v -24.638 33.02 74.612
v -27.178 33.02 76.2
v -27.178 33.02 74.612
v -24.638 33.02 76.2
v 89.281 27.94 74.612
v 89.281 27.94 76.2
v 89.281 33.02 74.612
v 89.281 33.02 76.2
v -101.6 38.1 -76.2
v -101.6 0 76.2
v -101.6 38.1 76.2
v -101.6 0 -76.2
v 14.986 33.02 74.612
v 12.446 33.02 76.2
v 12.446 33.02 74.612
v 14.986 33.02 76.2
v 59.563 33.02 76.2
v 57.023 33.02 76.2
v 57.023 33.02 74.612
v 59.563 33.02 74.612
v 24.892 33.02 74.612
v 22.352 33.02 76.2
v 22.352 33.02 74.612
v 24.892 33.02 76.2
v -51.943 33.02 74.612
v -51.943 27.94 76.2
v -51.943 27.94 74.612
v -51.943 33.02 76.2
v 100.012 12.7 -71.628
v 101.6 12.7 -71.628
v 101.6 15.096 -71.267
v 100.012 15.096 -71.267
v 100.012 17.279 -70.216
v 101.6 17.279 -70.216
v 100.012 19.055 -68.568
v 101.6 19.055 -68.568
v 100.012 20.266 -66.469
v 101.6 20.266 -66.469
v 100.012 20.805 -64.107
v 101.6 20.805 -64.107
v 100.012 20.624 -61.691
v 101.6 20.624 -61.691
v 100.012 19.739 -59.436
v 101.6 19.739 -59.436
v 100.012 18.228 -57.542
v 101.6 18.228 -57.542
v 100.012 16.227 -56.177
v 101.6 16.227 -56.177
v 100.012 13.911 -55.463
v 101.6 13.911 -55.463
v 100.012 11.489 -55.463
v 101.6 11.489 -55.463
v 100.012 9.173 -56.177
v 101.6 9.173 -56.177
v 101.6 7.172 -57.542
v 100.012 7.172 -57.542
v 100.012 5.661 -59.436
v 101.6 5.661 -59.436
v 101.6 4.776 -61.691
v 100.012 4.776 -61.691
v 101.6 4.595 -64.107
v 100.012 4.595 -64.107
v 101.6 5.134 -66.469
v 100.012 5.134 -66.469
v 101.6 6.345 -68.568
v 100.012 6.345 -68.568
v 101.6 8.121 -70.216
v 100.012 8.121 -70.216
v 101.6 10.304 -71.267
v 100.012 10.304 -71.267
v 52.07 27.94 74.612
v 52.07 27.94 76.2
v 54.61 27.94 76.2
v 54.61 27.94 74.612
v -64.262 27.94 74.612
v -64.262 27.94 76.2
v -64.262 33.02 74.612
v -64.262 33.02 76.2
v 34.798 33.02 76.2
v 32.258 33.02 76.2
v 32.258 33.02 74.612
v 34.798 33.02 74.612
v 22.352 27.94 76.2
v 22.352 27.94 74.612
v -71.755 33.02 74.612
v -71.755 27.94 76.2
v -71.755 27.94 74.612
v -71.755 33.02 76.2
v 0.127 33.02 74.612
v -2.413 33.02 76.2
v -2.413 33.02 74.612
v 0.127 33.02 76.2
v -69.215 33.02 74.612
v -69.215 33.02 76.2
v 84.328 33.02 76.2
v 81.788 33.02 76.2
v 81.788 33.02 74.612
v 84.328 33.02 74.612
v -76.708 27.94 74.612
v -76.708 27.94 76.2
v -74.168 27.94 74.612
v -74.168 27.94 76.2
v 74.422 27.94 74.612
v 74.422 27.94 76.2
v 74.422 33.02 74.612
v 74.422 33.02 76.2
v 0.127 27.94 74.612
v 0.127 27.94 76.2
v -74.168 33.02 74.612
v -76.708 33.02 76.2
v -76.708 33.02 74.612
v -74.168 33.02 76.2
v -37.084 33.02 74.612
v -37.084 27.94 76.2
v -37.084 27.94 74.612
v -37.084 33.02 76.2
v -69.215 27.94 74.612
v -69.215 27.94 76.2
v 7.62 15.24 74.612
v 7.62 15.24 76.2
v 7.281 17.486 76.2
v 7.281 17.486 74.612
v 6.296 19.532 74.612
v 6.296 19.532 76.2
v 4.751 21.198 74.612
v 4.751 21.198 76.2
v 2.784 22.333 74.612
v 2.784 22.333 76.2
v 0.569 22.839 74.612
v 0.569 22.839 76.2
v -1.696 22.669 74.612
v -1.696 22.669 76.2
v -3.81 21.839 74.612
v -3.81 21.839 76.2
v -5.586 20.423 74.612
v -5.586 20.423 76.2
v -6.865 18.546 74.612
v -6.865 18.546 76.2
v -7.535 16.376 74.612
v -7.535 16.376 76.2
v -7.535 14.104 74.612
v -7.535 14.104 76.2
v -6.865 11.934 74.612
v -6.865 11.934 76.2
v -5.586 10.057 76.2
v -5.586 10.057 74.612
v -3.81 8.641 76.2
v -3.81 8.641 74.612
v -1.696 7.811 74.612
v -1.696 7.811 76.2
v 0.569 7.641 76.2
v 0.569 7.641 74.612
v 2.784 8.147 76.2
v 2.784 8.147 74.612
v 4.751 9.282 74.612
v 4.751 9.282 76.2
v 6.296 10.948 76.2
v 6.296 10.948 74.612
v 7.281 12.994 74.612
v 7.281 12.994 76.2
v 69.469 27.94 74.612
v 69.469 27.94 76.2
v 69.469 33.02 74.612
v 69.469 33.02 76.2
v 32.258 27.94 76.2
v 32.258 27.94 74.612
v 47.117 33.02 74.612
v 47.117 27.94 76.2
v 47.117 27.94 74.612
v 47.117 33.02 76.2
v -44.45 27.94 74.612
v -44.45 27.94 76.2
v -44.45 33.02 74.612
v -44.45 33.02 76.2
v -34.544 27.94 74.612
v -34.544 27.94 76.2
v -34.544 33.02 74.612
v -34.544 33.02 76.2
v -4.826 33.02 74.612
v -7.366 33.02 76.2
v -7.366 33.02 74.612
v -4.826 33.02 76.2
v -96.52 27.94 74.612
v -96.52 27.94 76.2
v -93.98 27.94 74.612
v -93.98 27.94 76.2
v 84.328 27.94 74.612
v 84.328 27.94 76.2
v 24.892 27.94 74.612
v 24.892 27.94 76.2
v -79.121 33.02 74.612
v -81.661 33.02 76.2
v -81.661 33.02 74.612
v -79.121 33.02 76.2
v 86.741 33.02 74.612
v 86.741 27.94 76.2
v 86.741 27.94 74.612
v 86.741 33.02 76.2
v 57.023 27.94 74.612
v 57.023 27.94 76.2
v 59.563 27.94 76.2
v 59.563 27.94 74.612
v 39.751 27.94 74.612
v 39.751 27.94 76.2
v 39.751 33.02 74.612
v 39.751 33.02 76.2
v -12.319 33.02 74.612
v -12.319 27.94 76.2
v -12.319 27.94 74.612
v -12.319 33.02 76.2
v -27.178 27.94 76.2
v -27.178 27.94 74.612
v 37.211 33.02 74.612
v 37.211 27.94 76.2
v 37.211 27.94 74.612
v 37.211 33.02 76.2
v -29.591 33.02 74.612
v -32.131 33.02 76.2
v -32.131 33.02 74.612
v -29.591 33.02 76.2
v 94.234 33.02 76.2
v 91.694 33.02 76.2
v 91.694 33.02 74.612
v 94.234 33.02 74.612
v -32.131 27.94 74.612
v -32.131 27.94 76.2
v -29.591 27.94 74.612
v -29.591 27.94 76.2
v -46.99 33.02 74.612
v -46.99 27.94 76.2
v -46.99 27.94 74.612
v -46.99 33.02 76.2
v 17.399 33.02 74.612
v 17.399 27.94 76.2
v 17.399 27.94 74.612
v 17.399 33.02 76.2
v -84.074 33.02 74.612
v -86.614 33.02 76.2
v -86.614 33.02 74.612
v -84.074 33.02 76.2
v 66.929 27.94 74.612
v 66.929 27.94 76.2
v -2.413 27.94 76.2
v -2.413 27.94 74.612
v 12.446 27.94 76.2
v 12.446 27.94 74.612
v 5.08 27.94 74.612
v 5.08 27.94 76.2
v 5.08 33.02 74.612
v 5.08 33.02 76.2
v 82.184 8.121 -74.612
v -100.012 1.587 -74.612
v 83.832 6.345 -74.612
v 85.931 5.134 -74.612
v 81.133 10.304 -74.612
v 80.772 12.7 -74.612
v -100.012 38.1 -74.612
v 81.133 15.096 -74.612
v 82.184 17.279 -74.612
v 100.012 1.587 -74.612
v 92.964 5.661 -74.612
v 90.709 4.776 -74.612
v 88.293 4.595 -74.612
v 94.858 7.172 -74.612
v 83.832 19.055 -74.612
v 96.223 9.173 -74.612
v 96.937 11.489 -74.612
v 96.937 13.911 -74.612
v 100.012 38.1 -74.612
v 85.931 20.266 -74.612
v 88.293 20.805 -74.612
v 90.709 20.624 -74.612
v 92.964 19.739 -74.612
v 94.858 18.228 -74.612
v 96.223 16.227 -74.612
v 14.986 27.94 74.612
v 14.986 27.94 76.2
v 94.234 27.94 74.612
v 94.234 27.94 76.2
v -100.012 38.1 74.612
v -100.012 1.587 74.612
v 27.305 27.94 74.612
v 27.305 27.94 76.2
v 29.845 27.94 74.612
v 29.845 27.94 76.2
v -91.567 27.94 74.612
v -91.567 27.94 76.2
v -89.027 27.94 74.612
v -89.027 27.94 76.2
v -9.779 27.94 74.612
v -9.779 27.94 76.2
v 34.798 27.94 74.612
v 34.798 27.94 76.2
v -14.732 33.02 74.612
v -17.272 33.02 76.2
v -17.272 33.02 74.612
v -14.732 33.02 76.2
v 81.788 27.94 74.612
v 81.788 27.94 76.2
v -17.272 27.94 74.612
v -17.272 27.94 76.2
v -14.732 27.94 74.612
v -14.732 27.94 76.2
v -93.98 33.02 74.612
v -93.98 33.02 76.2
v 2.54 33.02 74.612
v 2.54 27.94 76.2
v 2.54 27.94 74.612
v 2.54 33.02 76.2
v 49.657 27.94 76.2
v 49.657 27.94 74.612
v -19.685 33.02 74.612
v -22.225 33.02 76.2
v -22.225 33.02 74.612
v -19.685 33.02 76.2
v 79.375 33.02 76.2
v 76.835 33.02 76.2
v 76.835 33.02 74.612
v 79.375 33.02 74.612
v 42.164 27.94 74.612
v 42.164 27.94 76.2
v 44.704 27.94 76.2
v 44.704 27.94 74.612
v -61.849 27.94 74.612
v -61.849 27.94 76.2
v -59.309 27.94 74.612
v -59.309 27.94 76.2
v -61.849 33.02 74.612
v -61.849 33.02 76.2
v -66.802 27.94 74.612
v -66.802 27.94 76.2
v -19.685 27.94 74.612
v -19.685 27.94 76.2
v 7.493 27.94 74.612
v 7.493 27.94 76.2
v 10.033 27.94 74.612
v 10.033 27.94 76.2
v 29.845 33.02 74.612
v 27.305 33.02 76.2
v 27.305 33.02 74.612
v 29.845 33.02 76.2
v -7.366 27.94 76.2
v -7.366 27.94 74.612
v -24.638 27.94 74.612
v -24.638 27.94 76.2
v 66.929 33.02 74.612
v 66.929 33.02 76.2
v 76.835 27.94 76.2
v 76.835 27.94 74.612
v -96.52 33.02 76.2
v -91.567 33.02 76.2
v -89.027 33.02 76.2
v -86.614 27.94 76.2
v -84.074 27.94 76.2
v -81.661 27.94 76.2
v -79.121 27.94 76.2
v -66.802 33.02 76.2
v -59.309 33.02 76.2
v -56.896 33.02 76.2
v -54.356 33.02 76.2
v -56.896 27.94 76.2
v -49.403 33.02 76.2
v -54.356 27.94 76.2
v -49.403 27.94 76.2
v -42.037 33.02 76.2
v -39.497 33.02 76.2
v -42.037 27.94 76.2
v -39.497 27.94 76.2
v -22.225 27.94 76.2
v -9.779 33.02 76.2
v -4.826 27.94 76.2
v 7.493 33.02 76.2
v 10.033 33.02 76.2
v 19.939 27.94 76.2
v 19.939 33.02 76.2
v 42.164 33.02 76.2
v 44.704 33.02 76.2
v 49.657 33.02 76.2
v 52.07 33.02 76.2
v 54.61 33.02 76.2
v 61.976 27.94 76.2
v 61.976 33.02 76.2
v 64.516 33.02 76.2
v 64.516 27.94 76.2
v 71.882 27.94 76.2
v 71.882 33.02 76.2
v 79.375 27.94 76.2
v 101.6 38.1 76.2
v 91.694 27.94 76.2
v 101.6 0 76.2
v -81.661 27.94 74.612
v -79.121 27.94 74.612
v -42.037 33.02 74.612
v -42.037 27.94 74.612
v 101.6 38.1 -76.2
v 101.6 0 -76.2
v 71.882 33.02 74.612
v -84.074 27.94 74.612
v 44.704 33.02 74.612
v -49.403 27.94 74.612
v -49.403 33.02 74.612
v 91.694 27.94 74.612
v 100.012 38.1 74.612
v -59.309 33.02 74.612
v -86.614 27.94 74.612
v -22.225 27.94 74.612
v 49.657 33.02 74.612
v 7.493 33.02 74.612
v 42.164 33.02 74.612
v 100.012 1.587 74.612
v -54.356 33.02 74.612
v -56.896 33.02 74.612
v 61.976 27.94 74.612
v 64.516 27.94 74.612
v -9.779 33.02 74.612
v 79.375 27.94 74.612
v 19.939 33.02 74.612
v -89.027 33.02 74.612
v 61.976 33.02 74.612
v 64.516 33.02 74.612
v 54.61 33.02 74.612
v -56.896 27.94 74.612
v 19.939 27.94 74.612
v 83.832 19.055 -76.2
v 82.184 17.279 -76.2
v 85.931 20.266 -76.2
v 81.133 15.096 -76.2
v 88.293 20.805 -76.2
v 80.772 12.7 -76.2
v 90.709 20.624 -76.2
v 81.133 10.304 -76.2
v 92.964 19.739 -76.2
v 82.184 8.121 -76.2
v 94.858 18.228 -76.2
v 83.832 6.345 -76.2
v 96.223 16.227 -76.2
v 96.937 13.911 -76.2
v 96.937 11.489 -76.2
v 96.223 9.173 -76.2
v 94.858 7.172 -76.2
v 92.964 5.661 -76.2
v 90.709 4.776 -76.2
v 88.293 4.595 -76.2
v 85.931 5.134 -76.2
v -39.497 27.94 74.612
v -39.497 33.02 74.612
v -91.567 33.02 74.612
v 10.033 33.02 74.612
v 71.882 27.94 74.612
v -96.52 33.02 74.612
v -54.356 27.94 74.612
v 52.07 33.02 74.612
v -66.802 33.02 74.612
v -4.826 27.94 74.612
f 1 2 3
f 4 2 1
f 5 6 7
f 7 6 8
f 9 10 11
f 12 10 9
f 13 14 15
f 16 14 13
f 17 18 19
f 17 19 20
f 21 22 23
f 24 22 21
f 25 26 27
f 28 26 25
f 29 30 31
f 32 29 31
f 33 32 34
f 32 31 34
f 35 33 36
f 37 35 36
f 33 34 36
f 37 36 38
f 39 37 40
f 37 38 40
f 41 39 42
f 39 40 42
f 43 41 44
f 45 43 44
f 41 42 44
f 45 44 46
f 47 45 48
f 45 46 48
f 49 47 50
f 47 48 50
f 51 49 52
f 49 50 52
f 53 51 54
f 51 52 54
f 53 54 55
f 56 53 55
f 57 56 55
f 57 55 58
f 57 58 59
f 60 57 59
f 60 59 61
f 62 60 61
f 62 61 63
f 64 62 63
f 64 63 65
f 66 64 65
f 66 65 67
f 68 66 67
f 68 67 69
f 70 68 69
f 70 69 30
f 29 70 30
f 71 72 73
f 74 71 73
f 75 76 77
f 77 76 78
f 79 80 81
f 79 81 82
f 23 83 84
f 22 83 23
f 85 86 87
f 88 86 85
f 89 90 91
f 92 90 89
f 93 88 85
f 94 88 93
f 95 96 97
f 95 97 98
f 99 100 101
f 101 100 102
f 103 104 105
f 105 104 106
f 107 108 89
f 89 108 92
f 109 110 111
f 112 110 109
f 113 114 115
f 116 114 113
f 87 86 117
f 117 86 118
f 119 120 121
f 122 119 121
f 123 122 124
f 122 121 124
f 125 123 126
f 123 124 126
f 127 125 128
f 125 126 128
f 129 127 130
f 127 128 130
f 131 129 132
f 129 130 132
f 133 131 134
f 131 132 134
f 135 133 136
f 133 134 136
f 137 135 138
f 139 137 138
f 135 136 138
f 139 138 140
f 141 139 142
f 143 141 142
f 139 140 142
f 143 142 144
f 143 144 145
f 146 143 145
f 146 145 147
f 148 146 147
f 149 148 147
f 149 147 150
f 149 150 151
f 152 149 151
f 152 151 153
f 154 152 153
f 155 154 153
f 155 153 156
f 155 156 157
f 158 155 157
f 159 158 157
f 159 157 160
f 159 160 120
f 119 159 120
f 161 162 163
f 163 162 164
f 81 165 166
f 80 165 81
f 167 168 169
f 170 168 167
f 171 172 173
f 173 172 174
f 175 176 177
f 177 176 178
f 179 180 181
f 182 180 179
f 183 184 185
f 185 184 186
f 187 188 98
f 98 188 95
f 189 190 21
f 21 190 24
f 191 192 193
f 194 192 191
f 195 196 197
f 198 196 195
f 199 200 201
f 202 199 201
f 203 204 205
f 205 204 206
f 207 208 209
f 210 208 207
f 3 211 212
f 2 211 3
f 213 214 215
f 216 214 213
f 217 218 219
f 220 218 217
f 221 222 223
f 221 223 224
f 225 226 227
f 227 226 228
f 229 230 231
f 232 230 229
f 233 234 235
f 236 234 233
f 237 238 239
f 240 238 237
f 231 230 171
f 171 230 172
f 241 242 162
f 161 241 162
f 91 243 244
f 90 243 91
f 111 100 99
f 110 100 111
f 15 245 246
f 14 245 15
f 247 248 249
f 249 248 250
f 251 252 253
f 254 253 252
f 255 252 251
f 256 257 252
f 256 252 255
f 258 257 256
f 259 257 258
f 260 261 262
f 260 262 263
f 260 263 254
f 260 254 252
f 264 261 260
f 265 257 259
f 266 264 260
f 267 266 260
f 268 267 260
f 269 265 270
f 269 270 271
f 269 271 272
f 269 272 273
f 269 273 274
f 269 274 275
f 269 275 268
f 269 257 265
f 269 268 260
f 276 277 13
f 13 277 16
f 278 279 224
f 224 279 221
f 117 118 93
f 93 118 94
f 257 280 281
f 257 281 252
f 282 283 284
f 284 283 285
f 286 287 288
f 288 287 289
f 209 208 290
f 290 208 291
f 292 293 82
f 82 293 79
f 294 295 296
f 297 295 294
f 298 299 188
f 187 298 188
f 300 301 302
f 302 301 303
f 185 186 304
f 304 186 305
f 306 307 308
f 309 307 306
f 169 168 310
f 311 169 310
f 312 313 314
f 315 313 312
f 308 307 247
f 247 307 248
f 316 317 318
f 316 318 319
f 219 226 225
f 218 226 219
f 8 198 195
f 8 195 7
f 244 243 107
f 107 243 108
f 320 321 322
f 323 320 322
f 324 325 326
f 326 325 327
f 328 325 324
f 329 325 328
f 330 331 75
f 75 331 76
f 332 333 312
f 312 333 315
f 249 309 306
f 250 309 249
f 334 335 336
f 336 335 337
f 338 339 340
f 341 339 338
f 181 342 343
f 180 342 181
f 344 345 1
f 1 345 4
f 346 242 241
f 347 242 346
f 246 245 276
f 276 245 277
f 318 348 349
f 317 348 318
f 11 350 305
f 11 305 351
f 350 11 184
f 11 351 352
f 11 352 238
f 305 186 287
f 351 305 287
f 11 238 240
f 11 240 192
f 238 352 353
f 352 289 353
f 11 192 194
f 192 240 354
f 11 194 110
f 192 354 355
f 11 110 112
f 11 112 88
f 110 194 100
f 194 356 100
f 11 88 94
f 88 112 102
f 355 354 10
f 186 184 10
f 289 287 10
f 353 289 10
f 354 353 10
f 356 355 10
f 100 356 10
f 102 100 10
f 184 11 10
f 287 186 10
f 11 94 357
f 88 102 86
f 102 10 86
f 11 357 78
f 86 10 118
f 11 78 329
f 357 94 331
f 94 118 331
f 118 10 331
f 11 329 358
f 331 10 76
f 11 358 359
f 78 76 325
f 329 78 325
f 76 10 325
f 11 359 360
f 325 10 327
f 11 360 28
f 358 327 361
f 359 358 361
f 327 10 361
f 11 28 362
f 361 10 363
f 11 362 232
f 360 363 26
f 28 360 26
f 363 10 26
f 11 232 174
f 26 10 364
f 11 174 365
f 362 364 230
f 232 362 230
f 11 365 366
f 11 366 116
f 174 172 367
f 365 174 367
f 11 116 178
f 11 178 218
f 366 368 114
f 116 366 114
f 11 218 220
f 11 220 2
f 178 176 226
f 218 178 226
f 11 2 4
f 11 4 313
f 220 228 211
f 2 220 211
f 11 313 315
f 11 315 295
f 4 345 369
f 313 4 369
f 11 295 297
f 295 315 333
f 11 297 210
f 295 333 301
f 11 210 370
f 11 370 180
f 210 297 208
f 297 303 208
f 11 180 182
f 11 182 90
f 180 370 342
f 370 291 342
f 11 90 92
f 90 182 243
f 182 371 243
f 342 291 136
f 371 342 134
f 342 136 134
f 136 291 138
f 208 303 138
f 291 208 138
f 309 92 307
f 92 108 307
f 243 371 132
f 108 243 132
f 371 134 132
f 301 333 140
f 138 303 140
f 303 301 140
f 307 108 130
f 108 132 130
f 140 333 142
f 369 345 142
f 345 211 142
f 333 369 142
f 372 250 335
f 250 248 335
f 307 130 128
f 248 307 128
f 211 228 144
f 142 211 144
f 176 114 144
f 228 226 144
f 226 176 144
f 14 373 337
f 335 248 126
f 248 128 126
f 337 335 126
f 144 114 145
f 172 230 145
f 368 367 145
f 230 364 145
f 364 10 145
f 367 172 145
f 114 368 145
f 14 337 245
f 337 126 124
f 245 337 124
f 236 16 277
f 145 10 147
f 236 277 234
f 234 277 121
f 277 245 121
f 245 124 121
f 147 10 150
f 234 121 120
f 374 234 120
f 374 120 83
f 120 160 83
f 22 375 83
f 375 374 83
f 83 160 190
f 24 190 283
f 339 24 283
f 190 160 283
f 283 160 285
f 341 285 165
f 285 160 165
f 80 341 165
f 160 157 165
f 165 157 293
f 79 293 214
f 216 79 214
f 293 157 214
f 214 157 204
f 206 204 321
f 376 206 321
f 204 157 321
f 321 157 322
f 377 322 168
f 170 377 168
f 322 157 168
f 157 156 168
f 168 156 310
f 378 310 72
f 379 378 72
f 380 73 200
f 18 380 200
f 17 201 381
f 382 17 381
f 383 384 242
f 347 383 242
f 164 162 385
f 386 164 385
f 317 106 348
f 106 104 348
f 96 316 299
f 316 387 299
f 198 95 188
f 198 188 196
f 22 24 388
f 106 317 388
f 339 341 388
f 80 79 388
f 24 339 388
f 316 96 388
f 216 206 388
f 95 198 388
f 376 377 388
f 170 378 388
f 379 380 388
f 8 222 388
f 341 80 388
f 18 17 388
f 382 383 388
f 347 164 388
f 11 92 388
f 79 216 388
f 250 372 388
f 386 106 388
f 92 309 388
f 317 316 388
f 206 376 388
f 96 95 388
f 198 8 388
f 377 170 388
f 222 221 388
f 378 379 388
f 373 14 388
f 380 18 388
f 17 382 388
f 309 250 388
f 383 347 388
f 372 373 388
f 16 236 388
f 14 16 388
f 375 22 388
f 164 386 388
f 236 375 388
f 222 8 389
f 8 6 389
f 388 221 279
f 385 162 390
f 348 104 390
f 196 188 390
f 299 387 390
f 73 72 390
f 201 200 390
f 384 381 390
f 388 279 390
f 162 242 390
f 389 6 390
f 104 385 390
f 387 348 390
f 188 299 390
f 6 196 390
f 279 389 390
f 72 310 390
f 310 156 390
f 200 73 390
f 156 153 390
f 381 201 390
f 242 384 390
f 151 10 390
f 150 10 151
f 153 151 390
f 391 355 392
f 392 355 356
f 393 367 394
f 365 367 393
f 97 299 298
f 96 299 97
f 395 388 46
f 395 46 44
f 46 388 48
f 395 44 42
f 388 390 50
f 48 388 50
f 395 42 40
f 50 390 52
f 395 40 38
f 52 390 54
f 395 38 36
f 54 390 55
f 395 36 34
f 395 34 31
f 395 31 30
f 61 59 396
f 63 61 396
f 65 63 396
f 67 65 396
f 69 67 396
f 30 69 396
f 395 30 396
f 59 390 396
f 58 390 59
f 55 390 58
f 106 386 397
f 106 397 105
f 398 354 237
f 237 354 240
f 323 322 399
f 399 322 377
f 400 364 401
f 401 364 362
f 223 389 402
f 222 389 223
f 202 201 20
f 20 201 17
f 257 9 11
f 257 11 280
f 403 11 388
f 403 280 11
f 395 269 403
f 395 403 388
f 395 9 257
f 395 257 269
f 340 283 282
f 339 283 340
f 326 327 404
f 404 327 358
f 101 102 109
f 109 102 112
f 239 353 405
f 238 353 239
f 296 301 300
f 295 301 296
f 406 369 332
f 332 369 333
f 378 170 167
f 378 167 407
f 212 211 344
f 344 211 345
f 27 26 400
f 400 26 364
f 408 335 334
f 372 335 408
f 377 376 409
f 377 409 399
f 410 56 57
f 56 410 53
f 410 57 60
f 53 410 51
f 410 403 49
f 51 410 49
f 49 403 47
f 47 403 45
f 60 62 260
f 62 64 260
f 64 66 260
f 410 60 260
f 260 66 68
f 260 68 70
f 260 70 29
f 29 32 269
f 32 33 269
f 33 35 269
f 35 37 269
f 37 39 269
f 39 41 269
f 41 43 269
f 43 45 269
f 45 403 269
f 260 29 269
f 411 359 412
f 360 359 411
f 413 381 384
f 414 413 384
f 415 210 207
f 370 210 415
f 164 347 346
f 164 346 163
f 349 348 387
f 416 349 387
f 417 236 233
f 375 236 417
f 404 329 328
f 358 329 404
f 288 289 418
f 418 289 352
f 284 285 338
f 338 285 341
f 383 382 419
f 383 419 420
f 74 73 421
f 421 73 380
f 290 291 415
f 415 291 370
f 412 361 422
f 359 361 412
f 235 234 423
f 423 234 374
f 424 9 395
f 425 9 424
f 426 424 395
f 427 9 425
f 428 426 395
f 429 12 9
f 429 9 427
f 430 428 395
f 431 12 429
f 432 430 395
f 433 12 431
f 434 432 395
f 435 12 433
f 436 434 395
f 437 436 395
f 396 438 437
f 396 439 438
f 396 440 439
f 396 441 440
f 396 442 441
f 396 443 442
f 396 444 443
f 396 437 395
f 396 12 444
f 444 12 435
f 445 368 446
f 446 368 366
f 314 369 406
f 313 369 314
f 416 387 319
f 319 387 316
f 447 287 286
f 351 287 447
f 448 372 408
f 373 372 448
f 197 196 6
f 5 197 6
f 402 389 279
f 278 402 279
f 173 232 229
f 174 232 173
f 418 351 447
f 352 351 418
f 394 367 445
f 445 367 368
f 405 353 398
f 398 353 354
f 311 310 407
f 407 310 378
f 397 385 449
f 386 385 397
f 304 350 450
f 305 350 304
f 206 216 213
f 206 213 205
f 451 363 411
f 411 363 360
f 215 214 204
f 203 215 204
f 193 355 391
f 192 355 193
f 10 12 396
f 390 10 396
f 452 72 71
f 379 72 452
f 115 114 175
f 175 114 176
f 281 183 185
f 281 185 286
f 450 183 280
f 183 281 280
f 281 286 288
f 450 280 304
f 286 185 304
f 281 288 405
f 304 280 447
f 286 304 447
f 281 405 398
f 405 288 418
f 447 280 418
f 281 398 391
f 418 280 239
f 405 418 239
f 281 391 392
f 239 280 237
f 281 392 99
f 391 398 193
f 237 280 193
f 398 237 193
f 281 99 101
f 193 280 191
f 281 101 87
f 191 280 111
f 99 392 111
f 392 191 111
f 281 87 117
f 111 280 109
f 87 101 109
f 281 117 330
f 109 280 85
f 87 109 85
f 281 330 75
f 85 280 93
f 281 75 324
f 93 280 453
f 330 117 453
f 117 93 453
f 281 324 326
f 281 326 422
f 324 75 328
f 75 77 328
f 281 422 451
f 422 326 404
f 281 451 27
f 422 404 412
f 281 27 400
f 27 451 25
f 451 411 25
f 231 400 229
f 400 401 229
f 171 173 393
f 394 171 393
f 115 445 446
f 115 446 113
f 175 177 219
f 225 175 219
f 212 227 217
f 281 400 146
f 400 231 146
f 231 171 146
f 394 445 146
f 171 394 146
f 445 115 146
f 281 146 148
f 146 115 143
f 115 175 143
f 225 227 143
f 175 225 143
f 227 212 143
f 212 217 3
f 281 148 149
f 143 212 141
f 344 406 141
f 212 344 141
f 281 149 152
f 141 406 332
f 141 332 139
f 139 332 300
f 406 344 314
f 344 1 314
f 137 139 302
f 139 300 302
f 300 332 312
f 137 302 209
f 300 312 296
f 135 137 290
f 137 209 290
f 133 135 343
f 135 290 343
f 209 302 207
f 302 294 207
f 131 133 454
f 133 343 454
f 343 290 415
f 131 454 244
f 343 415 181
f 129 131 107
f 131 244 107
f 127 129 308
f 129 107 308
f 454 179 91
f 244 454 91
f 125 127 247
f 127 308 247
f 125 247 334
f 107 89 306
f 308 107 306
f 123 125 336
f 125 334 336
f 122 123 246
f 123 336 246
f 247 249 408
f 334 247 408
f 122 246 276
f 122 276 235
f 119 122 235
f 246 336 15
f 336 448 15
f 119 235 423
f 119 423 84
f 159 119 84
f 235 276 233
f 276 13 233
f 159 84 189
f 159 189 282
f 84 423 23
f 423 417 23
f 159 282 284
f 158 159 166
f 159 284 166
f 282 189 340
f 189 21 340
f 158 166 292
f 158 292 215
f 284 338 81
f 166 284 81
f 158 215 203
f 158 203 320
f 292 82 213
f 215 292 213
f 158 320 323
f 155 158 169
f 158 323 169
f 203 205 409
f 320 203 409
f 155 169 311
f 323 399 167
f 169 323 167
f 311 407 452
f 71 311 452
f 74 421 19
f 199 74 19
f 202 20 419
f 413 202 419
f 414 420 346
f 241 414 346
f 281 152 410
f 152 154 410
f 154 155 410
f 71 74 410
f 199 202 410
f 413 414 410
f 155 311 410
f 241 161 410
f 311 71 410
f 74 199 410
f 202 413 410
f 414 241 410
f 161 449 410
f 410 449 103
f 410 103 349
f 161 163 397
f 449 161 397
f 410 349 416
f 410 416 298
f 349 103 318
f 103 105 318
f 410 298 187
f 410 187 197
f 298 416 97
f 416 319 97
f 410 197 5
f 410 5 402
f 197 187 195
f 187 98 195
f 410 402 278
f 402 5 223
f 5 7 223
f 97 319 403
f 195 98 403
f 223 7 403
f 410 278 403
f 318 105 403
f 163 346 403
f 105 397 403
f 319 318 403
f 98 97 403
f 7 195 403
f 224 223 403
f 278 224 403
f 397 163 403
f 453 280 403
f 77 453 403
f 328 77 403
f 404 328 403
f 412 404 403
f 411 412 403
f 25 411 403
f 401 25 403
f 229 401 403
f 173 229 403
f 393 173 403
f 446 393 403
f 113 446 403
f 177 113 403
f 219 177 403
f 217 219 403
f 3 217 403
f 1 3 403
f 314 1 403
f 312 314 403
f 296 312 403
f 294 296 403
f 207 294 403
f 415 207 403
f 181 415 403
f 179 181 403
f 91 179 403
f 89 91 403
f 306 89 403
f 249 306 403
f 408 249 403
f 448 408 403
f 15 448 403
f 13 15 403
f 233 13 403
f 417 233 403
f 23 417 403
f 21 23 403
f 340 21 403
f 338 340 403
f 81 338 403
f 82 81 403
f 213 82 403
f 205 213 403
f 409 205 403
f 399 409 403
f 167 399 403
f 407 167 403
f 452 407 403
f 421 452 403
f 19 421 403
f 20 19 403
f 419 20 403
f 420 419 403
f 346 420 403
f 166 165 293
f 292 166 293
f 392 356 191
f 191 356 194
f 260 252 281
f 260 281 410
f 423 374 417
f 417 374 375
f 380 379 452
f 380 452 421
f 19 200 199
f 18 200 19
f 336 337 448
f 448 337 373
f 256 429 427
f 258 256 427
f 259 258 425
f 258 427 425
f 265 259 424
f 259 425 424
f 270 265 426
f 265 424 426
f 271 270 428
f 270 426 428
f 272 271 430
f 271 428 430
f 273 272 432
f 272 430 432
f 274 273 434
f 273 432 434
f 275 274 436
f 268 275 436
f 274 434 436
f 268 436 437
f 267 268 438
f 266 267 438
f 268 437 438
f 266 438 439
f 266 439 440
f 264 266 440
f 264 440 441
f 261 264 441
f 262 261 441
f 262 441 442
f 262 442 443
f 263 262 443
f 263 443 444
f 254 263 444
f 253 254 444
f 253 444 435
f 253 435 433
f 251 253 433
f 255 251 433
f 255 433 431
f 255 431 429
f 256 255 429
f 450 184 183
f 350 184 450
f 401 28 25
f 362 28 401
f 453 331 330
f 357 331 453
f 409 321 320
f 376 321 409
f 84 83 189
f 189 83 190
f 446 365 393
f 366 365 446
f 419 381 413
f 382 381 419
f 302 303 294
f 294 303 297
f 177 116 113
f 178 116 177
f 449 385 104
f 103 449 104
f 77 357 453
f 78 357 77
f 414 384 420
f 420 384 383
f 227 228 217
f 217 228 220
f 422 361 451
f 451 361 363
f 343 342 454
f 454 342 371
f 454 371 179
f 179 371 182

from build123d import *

# Parameters (mm, degrees)
SKETCH1_W           = 203.2
SKETCH1_H           = 152.4
BOSS_EXTRUDE1_DEPTH = 38.1
SKETCH2_W           = 200.025
SKETCH2_H           = 149.225
CUT_EXTRUDE1_DEPTH  = 36.5125
SKETCH3_W           = 2.54
SKETCH3_H           = 5.08
CUT_EXTRUDE2_DEPTH  = 7.62
LPATTERN1_COUNT     = 39
LPATTERN1_PITCH     = 4.953
SKETCH4_R           = 7.62
CUT_EXTRUDE3_DEPTH  = 7.62
SKETCH5_R           = 8.128
CUT_EXTRUDE4_DEPTH  = 7.62
SKETCH6_R           = 8.128
CUT_EXTRUDE5_DEPTH  = 7.62


with BuildPart() as part:
    # Sketch1 → Boss-Extrude1 (new body)
    with BuildSketch(Plane(origin=(0, 0, 0), x_dir=(1, 0, 0), z_dir=(0, 1, 0))):
        Rectangle(SKETCH1_W, SKETCH1_H)
    extrude(amount=BOSS_EXTRUDE1_DEPTH)

    # Sketch2 → Cut-Extrude1 (cut)
    with BuildSketch(Plane(origin=(0, 38.1, 0), x_dir=(1, 0, 0), z_dir=(0, 1, 0))):
        Rectangle(SKETCH2_W, SKETCH2_H)
    extrude(amount=-CUT_EXTRUDE1_DEPTH, mode=Mode.SUBTRACT)

    # Sketch3 → Cut-Extrude2 (cut)
    with BuildSketch(Plane.XY.offset(76.2)):
        with Locations((-95.25, 30.48)):
            Rectangle(SKETCH3_W, SKETCH3_H)
    cut_extrude2 = extrude(amount=-CUT_EXTRUDE2_DEPTH, mode=Mode.SUBTRACT)

    # LPattern1: Cut-Extrude2 ×39
    with Locations(*[(i * LPATTERN1_PITCH, 0, 0) for i in range(1, LPATTERN1_COUNT)]):
        add(cut_extrude2, mode=Mode.SUBTRACT)

    # Sketch4 → Cut-Extrude3 (cut)
    with BuildSketch(Plane.XY.offset(76.2)):
        with Locations((0, 15.24)):
            Circle(SKETCH4_R)
    extrude(amount=-CUT_EXTRUDE3_DEPTH, mode=Mode.SUBTRACT)

    # Sketch5 → Cut-Extrude4 (cut)
    with BuildSketch(Plane(origin=(101.6, 0, 0), x_dir=(0, 0, -1), z_dir=(1, 0, 0))):
        with Locations((63.5, 12.7)):
            Circle(SKETCH5_R)
    extrude(amount=-CUT_EXTRUDE4_DEPTH, mode=Mode.SUBTRACT)

    # Sketch6 → Cut-Extrude5 (cut)
    with BuildSketch(Plane(origin=(0, 0, -76.2), x_dir=(-1, 0, 0), z_dir=(0, 0, -1))):
        with Locations((-88.9, 12.7)):
            Circle(SKETCH6_R)
    extrude(amount=-CUT_EXTRUDE5_DEPTH, mode=Mode.SUBTRACT)


solid = part.part
